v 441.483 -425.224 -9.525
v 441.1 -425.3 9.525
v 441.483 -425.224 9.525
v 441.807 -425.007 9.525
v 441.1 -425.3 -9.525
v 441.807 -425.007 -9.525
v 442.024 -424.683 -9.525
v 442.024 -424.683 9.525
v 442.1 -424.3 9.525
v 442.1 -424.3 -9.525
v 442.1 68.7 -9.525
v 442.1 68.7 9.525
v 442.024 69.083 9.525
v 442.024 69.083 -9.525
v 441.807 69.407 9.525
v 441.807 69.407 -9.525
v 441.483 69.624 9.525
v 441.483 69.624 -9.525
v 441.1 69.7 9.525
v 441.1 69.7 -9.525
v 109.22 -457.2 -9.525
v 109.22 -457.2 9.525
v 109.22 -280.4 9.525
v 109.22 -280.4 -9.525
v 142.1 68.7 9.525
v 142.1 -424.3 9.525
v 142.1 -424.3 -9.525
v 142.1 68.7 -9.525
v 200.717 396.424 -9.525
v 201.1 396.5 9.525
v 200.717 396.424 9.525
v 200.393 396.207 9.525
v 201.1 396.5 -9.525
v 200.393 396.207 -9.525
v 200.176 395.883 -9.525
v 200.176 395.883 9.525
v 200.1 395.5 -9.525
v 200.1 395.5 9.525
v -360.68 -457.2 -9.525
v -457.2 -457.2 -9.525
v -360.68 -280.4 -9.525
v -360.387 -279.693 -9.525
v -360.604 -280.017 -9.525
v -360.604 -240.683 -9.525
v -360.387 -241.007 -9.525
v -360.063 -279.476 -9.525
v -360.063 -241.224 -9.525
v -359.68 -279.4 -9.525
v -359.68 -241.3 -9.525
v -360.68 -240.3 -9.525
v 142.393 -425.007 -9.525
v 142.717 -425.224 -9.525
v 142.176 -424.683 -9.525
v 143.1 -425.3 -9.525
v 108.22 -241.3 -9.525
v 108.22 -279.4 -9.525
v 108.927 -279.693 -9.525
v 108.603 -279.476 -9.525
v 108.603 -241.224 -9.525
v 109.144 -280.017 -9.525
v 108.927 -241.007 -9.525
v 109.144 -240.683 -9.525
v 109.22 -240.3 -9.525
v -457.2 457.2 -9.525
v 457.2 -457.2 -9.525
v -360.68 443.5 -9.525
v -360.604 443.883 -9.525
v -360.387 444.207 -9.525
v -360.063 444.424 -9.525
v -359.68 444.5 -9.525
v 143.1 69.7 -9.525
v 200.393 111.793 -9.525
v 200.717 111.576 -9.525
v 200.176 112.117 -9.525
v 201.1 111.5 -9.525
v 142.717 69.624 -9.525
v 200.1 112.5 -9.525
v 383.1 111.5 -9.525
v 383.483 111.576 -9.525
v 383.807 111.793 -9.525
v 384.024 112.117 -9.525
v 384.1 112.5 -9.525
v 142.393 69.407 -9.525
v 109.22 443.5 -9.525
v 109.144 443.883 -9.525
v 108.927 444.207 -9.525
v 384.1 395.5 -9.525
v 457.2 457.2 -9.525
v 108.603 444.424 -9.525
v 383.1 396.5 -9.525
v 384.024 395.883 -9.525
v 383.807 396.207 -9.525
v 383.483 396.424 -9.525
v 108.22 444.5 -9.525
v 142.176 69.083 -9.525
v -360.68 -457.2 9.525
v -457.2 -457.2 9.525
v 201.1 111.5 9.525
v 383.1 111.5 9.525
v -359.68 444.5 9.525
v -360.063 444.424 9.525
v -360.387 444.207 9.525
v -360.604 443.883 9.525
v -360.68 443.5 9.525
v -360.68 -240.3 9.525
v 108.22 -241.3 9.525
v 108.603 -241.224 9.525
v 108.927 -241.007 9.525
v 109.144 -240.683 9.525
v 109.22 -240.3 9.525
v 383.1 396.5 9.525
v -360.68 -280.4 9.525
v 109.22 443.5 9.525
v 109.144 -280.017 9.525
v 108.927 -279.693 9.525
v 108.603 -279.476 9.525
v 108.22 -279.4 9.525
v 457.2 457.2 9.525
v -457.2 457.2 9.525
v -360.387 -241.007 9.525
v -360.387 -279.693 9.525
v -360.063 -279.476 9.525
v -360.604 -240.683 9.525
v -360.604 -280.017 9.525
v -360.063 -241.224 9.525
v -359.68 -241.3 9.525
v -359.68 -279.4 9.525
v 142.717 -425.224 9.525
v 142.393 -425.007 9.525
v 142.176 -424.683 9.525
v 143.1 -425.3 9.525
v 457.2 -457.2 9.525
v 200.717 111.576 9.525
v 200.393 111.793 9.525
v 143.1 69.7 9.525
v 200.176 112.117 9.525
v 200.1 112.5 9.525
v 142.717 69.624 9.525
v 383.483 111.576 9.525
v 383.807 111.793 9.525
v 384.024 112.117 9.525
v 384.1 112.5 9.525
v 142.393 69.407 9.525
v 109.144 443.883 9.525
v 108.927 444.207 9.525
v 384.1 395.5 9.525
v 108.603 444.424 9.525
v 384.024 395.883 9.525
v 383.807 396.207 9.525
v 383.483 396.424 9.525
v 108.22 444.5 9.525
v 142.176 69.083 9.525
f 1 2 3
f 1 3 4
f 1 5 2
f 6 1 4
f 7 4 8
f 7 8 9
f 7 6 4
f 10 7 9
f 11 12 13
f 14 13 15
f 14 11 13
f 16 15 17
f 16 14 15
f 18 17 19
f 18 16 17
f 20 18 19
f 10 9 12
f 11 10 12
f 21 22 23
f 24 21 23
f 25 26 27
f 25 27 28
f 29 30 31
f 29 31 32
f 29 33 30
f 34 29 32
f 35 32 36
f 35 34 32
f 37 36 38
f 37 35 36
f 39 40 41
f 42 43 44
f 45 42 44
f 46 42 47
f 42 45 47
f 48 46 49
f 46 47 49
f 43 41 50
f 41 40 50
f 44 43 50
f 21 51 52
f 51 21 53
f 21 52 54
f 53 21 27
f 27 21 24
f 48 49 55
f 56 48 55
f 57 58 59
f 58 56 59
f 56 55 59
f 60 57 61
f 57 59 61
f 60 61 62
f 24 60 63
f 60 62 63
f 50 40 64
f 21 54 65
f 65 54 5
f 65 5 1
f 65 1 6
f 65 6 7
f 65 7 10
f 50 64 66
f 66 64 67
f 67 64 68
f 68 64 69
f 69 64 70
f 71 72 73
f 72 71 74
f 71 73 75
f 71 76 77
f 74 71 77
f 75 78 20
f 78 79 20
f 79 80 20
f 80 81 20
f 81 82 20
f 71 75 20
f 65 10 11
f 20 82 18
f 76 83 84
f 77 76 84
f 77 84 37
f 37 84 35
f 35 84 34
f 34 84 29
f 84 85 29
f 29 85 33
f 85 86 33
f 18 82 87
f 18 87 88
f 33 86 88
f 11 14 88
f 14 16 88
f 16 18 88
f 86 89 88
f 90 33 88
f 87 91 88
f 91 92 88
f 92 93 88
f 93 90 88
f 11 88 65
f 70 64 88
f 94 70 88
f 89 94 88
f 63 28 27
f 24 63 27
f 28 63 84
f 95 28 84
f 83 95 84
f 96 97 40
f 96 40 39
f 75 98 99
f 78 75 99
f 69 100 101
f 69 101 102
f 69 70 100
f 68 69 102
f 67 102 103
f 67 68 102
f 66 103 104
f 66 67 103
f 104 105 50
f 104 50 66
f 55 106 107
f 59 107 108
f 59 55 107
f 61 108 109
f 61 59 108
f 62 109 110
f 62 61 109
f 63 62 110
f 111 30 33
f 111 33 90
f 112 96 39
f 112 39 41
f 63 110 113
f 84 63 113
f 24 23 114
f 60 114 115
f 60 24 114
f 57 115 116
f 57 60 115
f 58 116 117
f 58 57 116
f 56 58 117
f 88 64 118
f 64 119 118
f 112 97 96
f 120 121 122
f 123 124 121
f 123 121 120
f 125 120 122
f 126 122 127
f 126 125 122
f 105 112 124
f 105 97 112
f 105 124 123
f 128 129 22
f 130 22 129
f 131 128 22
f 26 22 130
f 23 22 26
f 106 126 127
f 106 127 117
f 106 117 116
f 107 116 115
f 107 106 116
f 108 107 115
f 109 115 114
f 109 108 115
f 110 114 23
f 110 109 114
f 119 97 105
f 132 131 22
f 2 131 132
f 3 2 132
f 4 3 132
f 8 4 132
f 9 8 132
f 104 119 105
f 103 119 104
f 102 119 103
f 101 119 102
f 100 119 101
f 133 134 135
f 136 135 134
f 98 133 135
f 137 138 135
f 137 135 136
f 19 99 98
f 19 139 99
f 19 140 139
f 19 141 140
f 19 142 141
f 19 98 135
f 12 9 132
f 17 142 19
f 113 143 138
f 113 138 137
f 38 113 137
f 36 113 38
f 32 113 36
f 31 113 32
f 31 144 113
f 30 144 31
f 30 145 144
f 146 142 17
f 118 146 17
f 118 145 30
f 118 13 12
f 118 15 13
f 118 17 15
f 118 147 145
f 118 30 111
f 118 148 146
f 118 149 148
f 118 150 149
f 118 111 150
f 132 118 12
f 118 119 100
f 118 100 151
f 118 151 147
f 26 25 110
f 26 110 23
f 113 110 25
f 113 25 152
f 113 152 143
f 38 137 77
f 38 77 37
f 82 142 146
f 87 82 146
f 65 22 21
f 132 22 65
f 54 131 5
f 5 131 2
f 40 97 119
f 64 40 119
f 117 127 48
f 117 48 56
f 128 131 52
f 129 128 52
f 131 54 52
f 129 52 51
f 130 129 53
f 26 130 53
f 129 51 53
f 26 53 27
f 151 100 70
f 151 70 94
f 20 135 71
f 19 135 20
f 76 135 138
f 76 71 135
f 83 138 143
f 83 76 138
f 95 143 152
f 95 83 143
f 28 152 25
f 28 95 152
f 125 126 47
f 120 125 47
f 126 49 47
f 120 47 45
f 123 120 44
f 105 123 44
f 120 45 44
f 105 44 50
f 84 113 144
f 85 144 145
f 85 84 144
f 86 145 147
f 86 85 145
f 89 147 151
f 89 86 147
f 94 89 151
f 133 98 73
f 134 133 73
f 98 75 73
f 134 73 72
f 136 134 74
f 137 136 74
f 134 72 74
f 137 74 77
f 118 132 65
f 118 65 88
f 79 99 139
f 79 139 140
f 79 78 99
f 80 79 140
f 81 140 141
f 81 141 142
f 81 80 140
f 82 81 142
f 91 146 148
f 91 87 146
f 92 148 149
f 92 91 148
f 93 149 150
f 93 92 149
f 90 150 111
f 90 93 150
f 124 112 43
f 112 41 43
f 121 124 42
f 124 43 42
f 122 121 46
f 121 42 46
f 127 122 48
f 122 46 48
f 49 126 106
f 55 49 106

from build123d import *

# Parameters (mm, degrees)
SKETCH1_W           = 914.4
SKETCH1_H           = 914.4
BOSS_EXTRUDE1_DEPTH = 9.525
SKETCH2_W           = 184
SKETCH2_H           = 285
SKETCH2_W_2         = 300
SKETCH2_H_2         = 495
SKETCH2_W_3         = 469.9
SKETCH2_H_3         = 685.8
SKETCH2_H_4         = 177.8
CUT_EXTRUDE1_DEPTH  = 647.859012846
FILLET1_R           = 1


with BuildPart() as part:
    # Sketch1 → Boss-Extrude1 (new, symmetric)
    with BuildSketch(Plane.XY):
        Rectangle(SKETCH1_W, SKETCH1_H)
    extrude(amount=BOSS_EXTRUDE1_DEPTH, both=True)

    # Sketch2 → Cut-Extrude1 (cut, through all)
    with BuildSketch(Plane.XY.offset(9.525)):
        with Locations((292.1, 254)):
            Rectangle(SKETCH2_W, SKETCH2_H)
        with Locations((292.1, -177.8)):
            Rectangle(SKETCH2_W_2, SKETCH2_H_2)
        with Locations((-125.73, 101.6)):
            Rectangle(SKETCH2_W_3, SKETCH2_H_3)
        with Locations((-125.73, -368.3)):
            Rectangle(SKETCH2_W_3, SKETCH2_H_4)
    extrude(amount=-CUT_EXTRUDE1_DEPTH, mode=Mode.SUBTRACT)

    # Fillet1
    fillet1_edges = [part.edges().sort_by_distance(p)[0] for p in [
        (142.1, -425.3, 0),
        (142.1, 69.7, 0),
        (442.1, 69.7, 0),
        (442.1, -425.3, 0),
        (-360.68, -241.3, 0),
        (-360.68, 444.5, 0),
        (109.22, 444.5, 0),
        (109.22, -241.3, 0),
        (-360.68, -279.4, 0),
        (109.22, -279.4, 0),
        (200.1, 111.5, 0),
        (200.1, 396.5, 0),
        (384.1, 396.5, 0),
        (384.1, 111.5, 0),
    ]]
    fillet(fillet1_edges, radius=FILLET1_R)


solid = part.part
